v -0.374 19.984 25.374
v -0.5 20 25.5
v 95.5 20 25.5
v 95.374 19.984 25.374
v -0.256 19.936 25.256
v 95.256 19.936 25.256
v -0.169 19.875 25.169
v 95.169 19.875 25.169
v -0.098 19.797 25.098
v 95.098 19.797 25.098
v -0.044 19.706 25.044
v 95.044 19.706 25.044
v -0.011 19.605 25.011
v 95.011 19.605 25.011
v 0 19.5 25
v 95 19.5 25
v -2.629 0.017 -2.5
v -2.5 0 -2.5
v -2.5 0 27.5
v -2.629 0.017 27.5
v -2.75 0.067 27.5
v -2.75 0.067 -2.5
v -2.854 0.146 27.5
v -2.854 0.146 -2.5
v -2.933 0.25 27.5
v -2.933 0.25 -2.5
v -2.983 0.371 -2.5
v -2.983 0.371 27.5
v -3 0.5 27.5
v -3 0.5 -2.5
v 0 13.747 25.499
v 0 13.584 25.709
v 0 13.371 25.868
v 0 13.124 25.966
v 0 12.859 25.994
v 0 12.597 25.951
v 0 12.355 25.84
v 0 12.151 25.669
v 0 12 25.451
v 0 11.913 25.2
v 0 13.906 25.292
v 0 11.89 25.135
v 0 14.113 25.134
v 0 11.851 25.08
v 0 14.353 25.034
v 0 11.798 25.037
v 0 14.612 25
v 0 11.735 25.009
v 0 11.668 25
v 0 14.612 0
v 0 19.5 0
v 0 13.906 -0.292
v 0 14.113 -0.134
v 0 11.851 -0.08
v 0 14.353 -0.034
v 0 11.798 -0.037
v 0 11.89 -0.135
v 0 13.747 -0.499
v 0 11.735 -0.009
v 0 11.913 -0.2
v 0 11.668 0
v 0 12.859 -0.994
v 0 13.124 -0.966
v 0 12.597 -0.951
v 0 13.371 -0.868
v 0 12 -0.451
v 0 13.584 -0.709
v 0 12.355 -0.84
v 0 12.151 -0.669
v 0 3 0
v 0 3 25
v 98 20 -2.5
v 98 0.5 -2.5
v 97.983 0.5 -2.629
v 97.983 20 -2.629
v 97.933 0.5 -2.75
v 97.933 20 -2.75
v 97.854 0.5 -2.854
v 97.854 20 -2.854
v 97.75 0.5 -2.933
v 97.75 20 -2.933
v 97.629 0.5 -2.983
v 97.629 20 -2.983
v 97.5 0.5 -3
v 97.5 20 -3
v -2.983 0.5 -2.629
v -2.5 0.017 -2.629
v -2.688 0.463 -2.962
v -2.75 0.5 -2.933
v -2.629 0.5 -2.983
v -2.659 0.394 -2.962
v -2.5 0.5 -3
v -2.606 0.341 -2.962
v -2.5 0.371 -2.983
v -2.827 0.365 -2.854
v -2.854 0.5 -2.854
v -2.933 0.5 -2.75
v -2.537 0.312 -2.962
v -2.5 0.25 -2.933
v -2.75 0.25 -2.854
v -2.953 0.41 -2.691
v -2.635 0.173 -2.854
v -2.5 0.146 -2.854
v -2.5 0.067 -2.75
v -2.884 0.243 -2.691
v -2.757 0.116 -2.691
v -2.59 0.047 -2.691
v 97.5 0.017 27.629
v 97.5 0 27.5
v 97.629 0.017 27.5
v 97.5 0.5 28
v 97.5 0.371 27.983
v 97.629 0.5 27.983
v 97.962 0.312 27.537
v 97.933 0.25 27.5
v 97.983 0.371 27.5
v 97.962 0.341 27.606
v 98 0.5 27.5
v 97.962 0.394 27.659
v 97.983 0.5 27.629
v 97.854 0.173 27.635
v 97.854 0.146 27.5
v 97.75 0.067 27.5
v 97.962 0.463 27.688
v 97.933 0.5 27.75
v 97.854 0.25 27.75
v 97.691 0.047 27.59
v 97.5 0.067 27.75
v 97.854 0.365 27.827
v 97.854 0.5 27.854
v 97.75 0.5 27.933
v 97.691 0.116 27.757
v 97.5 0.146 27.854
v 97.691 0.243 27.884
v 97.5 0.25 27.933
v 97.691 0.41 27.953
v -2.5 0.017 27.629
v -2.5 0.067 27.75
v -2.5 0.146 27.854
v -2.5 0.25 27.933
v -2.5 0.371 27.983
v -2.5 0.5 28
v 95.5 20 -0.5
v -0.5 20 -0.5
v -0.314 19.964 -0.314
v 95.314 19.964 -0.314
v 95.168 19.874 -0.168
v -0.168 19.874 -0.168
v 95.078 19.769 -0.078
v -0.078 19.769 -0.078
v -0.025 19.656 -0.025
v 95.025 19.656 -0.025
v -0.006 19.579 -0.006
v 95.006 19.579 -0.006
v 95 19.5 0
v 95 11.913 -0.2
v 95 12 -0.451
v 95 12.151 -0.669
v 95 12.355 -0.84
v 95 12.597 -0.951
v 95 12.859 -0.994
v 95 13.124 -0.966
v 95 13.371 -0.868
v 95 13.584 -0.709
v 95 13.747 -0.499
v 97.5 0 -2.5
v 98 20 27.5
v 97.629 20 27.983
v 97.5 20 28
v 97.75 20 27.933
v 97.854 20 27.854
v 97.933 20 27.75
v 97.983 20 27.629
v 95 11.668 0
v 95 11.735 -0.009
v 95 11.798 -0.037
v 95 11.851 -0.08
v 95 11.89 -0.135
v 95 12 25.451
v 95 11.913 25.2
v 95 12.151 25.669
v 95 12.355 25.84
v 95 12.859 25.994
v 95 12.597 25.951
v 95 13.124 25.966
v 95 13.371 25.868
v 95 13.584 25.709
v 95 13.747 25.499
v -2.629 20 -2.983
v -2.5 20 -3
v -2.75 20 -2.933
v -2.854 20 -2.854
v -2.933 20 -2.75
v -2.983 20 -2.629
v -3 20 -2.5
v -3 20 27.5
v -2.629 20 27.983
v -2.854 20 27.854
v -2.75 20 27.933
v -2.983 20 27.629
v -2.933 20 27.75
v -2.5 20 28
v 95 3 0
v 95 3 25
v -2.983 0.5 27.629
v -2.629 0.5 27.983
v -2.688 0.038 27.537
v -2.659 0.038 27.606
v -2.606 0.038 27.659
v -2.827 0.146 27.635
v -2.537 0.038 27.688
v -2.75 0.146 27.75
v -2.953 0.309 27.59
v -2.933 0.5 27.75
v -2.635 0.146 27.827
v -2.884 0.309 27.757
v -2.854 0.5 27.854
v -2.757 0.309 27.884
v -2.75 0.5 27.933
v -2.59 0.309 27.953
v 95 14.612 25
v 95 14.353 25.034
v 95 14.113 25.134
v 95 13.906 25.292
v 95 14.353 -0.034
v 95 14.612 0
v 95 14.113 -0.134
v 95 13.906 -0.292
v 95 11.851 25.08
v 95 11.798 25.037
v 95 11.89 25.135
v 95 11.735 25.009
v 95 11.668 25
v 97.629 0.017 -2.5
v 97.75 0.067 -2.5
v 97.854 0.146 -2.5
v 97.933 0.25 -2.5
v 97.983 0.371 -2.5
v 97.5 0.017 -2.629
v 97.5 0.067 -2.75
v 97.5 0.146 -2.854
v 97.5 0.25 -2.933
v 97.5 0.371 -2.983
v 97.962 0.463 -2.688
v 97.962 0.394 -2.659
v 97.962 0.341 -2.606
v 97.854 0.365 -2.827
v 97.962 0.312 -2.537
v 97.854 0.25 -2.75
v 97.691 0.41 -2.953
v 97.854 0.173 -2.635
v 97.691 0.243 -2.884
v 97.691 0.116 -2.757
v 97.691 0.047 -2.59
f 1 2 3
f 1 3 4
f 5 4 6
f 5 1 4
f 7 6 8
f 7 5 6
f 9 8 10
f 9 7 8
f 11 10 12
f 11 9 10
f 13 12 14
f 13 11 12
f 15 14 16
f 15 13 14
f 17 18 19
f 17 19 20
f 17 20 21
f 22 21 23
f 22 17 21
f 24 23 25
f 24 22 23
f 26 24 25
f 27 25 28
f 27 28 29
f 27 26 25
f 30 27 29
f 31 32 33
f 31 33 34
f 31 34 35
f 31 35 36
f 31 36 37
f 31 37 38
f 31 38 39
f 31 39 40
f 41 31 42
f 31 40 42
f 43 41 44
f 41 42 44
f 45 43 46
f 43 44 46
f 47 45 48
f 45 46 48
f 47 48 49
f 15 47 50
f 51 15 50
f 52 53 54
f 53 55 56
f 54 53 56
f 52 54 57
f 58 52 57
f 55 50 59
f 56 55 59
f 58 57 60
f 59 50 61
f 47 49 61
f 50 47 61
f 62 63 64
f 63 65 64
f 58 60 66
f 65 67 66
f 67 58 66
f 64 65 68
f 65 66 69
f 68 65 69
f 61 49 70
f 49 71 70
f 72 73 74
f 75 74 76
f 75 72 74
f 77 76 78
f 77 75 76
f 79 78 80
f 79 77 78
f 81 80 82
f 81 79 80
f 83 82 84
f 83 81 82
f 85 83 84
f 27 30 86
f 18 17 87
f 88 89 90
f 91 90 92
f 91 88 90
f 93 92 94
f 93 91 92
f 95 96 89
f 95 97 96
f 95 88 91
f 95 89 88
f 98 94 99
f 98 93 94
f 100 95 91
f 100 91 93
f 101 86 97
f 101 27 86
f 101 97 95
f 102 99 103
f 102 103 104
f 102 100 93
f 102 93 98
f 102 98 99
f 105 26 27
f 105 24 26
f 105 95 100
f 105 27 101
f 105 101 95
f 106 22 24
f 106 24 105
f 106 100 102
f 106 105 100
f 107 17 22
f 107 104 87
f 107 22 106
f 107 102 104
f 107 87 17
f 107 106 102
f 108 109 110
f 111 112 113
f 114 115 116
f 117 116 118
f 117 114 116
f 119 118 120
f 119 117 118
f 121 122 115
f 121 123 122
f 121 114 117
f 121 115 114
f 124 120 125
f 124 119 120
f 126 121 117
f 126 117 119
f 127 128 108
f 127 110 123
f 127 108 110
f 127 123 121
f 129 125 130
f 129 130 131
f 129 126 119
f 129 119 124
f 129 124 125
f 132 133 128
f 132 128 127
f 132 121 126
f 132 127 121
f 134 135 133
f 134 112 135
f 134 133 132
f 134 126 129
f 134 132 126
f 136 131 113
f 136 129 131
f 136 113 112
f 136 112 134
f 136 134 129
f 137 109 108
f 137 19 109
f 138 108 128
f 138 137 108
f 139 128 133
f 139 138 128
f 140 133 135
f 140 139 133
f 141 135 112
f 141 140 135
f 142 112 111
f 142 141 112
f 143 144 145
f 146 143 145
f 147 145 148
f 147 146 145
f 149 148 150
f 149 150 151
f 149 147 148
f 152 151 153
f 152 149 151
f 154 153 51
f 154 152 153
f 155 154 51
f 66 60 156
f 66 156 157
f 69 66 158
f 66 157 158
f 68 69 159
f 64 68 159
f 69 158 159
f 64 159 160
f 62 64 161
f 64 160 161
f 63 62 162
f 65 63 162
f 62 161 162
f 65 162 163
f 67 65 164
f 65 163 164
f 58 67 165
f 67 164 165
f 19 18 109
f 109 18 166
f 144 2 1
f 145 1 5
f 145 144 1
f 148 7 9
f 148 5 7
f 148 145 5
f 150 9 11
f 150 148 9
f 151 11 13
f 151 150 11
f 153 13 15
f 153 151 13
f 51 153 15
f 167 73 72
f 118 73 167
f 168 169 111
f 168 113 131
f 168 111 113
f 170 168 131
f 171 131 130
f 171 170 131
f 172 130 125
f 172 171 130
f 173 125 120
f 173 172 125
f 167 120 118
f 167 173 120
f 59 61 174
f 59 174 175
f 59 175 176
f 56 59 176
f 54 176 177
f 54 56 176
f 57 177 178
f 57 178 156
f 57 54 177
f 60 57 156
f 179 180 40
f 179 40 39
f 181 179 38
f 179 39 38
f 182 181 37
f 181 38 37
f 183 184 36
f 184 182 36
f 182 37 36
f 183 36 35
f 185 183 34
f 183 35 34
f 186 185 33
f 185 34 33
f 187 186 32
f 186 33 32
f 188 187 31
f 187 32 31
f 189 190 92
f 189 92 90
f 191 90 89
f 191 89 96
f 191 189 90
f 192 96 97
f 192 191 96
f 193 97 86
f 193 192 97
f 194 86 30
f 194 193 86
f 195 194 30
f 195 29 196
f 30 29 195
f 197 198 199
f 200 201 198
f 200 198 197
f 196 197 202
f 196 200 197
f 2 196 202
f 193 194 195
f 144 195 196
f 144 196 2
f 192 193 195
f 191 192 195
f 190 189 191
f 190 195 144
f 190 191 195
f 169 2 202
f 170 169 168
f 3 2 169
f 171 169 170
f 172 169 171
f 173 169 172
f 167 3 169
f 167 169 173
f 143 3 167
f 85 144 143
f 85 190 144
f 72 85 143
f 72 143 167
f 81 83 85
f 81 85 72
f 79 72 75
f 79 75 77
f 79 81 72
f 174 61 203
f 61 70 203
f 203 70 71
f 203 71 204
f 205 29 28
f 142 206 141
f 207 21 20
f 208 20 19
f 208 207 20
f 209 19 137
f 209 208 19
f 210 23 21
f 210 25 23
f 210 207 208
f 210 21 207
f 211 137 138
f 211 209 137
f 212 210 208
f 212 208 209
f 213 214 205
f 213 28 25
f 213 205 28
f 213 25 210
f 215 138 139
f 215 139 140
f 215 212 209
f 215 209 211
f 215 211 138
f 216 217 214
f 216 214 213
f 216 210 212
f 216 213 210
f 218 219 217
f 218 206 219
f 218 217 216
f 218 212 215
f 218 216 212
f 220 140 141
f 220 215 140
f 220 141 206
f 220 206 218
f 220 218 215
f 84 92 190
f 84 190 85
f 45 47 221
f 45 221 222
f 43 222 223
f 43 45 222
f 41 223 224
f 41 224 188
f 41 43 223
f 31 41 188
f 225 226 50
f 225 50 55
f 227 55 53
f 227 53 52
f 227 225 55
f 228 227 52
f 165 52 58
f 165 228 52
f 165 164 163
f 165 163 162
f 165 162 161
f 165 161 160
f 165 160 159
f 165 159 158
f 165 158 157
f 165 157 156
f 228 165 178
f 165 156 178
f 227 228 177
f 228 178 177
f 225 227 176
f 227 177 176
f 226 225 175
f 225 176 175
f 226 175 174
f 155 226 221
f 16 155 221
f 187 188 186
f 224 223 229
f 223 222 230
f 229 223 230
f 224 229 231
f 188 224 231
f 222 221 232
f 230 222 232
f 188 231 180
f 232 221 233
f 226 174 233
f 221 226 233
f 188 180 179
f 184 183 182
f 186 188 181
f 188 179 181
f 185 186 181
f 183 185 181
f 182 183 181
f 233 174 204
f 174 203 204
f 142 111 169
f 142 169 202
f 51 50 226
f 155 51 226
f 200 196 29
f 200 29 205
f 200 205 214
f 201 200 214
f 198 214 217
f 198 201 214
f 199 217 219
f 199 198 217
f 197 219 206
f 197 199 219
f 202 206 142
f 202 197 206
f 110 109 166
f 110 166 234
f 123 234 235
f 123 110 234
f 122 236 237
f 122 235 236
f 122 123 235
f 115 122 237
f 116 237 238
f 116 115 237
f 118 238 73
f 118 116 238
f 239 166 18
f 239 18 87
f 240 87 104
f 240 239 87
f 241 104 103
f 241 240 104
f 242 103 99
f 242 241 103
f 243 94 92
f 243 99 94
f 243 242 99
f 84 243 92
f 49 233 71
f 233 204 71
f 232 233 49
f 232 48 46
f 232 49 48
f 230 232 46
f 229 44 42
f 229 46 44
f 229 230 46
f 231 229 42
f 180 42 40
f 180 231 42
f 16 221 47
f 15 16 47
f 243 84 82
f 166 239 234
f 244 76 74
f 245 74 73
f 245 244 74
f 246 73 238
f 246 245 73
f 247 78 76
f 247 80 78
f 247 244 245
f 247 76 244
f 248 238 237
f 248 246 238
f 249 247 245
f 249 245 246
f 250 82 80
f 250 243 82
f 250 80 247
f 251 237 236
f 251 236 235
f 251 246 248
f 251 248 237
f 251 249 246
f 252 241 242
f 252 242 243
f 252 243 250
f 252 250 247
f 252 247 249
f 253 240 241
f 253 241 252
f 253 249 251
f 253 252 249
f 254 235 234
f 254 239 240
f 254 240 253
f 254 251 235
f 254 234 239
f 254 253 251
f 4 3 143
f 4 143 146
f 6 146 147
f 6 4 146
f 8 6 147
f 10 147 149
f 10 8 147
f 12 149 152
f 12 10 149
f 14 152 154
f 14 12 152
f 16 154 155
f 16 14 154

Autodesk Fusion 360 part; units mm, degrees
sketch "Sketch1" plane through (0, 0, 0) normal (0, 1, 0) x (1, 0, 0)
  line L0 (0, 0) -> (95, 0)
  line L1 (95, 0) -> (95, -25)
  line L2 (95, -25) -> (0, -25)
  line L3 (0, -25) -> (0, 0)
  line L4 (98, 3) -> (98, -28)
  line L5 (98, -28) -> (-3, -28)
  line L6 (-3, -28) -> (-3, 3)
  line L7 (-3, 3) -> (98, 3)
  dimension "d1" = 95
  dimension "d2" = 25
  dimension "d3" = -3
extrude "Extrude1" add sketch "Sketch1" along normal blind 20 makes body 1
extrude "Extrude2" add sketch "Sketch1" along normal blind 3 contours L0 L1 L2 L3 bodies 1
ref_plane "WorkPlane1" through (47.5, 10, 12.5) normal (0, 0, 1) x (1, 0, 0)
ref_plane "WorkPlane2" through (47.5, 10, 12.5) normal (1, 0, 0) x (0, 0, -1)
sketch "Sketch3" plane through (47.5, 0, 0) normal (1, 0, 0) x (0, 1, 0)
  line L0 (20, 28) -> (0, 28)
  line L1 (0, 28) -> (0, -3)
  line L2 (0, -3) -> (20, -3)
  line L3 (20, -3) -> (20, 0)
  line L4 (20, 0) -> (3, 0)
  line L5 (3, 0) -> (3, 25)
  line L6 (3, 25) -> (20, 25)
  line L7 (20, 25) -> (20, 28)
  circle A0 centre (12.8865, 25) radius 0.75
  circle A1 centre (12.8865, 25) radius 0.9942
  arc A2 (12.1481, 24.8686) -> (20, 21.2966) centre (16.9616, 25.0336) ccw
  arc A3 (13.6365, 25) -> (20, 25) centre (16.8183, 27.2777) ccw
  line L8 (23.2, 12.5) -> (-3.2, 12.5)
  line L9 (20, 28) -> (20, -3)
  line L10 (20, 28) -> (16, 28)
  line L11 (16, 28) -> (16, -3)
  line L12 (20, -3) -> (16, -3)
  arc A4 (20, 0) -> (13.6365, 0) centre (16.8183, -2.2777) ccw
  arc A5 (20, 3.7034) -> (12.1481, 0.1314) centre (16.9616, -0.0336) ccw
  circle A6 centre (12.8865, 0) radius 0.75
  circle A7 centre (12.8865, 0) radius 0.9942
  dimension "d8" = 1.5
extrude "Extrude9" cut sketch "Sketch3" along normal mid plane 95 contours L6 A1 A3 | L6 A0 A1 | A0 A1 A2 A3 | L6 A0 | L6 A0 | L6 A0 A1 A2 | L4 A5 A6 A7 | L4 A6 A7 | A4 A5 A6 A7 | L4 A4 A7 | L4 A6 | L4 A6 bodies 1
extrude "Extrude10" add sketch "Sketch3" along normal blind 4 from surface at 20 separate body contours A2 A3 L9 L11 | A1 A2 A3 L11 | A0 A1 A2 A3 | L6 A0 | L6 A0 | L9 L11 A4 A5 | L11 A4 A5 A7 | A4 A5 A6 A7 | L4 A6 | L4 A6 makes body 2 at (70.1667, 12.334, 23.6987) makes body 3 at (70.1667, 18.5562, 4.5111)
extrude "Extrude11" add sketch "Sketch3" along normal blind 4 from surface at -20 separate body contours A2 A3 L9 L11 | A1 A2 A3 L11 | A0 A1 A2 A3 | L6 A0 | L6 A0 | L9 L11 A4 A5 | L11 A4 A5 A7 | A4 A5 A6 A7 | L4 A6 | L4 A6 makes body 4 at (30.1667, 18.5562, 4.5111) makes body 5 at (30.1667, 12.334, 23.6987)
extrude "Extrude12" add sketch "Sketch3" along normal mid plane 101 separate body contours L0 L6 L7 L9 L10 L11 | L6 A3 L11 | A2 A3 L9 L11 | A2 L8 L9 L11 | L8 L9 L11 A5 | L9 L11 A4 A5 | L2 L3 L4 L9 L11 L12 | L4 L11 A4 makes body 6
sketch "Sketch8" plane through (0, 16, 0) normal (0, -1, 0) x (1, 0, 0)
  line L0 (-3, -3) -> (98, -3)
  line L1 (98, -3) -> (98, 28)
  line L2 (98, 28) -> (-3, 28)
  line L3 (-3, 28) -> (-3, -3)
  line L4 (0, 10) -> (2.4867, 10)
  line L5 (2.4867, 10) -> (2.4867, 15)
  line L6 (2.4867, 15) -> (0, 15)
  line L7 (0, 15) -> (0, 10)
  line L8 (95, 10) -> (93, 10)
  line L9 (93, 10) -> (93, 15)
  line L10 (93, 15) -> (95, 15)
  line L11 (95, 10) -> (95, 15)
extrude "Extrude13" add sketch "Sketch8" along normal blind 2 contours L4 L5 L6 L7 | L8 L9 L10 L11 bodies 6
fillet "Fillet5" radius 0.5 4 edges at (47.5, 20, 28) (98, 20, 12.5) (47.5, 20, -3) (-3, 20, 12.5) on bodies 6
fillet "Fillet6" radius 1 2 edges at (47.5, 13.8807, 25) (47.5, 13.8807, 0) on bodies 1
fillet "Fillet7" radius 0.5 8 edges at (-3, 10, 28) (-3, 0, 12.5) (-3, 10, -3) (47.5, 0, -3) (47.5, 0, 28) (98, 0, 12.5) (98, 10, -3) (98, 10, 28) on bodies 1
fillet "Fillet8" radius 0.25 2 edges at (47.5, 11.8923, 0) (47.5, 11.8923, 25) on bodies 1
fillet "Fillet9" radius 0.5 4 edges at (47.5, 20, 0) (0, 20, 12.5) (47.5, 20, 25) (95, 20, 12.5) on bodies 1
hidden bodies 2 3 5 4 6
